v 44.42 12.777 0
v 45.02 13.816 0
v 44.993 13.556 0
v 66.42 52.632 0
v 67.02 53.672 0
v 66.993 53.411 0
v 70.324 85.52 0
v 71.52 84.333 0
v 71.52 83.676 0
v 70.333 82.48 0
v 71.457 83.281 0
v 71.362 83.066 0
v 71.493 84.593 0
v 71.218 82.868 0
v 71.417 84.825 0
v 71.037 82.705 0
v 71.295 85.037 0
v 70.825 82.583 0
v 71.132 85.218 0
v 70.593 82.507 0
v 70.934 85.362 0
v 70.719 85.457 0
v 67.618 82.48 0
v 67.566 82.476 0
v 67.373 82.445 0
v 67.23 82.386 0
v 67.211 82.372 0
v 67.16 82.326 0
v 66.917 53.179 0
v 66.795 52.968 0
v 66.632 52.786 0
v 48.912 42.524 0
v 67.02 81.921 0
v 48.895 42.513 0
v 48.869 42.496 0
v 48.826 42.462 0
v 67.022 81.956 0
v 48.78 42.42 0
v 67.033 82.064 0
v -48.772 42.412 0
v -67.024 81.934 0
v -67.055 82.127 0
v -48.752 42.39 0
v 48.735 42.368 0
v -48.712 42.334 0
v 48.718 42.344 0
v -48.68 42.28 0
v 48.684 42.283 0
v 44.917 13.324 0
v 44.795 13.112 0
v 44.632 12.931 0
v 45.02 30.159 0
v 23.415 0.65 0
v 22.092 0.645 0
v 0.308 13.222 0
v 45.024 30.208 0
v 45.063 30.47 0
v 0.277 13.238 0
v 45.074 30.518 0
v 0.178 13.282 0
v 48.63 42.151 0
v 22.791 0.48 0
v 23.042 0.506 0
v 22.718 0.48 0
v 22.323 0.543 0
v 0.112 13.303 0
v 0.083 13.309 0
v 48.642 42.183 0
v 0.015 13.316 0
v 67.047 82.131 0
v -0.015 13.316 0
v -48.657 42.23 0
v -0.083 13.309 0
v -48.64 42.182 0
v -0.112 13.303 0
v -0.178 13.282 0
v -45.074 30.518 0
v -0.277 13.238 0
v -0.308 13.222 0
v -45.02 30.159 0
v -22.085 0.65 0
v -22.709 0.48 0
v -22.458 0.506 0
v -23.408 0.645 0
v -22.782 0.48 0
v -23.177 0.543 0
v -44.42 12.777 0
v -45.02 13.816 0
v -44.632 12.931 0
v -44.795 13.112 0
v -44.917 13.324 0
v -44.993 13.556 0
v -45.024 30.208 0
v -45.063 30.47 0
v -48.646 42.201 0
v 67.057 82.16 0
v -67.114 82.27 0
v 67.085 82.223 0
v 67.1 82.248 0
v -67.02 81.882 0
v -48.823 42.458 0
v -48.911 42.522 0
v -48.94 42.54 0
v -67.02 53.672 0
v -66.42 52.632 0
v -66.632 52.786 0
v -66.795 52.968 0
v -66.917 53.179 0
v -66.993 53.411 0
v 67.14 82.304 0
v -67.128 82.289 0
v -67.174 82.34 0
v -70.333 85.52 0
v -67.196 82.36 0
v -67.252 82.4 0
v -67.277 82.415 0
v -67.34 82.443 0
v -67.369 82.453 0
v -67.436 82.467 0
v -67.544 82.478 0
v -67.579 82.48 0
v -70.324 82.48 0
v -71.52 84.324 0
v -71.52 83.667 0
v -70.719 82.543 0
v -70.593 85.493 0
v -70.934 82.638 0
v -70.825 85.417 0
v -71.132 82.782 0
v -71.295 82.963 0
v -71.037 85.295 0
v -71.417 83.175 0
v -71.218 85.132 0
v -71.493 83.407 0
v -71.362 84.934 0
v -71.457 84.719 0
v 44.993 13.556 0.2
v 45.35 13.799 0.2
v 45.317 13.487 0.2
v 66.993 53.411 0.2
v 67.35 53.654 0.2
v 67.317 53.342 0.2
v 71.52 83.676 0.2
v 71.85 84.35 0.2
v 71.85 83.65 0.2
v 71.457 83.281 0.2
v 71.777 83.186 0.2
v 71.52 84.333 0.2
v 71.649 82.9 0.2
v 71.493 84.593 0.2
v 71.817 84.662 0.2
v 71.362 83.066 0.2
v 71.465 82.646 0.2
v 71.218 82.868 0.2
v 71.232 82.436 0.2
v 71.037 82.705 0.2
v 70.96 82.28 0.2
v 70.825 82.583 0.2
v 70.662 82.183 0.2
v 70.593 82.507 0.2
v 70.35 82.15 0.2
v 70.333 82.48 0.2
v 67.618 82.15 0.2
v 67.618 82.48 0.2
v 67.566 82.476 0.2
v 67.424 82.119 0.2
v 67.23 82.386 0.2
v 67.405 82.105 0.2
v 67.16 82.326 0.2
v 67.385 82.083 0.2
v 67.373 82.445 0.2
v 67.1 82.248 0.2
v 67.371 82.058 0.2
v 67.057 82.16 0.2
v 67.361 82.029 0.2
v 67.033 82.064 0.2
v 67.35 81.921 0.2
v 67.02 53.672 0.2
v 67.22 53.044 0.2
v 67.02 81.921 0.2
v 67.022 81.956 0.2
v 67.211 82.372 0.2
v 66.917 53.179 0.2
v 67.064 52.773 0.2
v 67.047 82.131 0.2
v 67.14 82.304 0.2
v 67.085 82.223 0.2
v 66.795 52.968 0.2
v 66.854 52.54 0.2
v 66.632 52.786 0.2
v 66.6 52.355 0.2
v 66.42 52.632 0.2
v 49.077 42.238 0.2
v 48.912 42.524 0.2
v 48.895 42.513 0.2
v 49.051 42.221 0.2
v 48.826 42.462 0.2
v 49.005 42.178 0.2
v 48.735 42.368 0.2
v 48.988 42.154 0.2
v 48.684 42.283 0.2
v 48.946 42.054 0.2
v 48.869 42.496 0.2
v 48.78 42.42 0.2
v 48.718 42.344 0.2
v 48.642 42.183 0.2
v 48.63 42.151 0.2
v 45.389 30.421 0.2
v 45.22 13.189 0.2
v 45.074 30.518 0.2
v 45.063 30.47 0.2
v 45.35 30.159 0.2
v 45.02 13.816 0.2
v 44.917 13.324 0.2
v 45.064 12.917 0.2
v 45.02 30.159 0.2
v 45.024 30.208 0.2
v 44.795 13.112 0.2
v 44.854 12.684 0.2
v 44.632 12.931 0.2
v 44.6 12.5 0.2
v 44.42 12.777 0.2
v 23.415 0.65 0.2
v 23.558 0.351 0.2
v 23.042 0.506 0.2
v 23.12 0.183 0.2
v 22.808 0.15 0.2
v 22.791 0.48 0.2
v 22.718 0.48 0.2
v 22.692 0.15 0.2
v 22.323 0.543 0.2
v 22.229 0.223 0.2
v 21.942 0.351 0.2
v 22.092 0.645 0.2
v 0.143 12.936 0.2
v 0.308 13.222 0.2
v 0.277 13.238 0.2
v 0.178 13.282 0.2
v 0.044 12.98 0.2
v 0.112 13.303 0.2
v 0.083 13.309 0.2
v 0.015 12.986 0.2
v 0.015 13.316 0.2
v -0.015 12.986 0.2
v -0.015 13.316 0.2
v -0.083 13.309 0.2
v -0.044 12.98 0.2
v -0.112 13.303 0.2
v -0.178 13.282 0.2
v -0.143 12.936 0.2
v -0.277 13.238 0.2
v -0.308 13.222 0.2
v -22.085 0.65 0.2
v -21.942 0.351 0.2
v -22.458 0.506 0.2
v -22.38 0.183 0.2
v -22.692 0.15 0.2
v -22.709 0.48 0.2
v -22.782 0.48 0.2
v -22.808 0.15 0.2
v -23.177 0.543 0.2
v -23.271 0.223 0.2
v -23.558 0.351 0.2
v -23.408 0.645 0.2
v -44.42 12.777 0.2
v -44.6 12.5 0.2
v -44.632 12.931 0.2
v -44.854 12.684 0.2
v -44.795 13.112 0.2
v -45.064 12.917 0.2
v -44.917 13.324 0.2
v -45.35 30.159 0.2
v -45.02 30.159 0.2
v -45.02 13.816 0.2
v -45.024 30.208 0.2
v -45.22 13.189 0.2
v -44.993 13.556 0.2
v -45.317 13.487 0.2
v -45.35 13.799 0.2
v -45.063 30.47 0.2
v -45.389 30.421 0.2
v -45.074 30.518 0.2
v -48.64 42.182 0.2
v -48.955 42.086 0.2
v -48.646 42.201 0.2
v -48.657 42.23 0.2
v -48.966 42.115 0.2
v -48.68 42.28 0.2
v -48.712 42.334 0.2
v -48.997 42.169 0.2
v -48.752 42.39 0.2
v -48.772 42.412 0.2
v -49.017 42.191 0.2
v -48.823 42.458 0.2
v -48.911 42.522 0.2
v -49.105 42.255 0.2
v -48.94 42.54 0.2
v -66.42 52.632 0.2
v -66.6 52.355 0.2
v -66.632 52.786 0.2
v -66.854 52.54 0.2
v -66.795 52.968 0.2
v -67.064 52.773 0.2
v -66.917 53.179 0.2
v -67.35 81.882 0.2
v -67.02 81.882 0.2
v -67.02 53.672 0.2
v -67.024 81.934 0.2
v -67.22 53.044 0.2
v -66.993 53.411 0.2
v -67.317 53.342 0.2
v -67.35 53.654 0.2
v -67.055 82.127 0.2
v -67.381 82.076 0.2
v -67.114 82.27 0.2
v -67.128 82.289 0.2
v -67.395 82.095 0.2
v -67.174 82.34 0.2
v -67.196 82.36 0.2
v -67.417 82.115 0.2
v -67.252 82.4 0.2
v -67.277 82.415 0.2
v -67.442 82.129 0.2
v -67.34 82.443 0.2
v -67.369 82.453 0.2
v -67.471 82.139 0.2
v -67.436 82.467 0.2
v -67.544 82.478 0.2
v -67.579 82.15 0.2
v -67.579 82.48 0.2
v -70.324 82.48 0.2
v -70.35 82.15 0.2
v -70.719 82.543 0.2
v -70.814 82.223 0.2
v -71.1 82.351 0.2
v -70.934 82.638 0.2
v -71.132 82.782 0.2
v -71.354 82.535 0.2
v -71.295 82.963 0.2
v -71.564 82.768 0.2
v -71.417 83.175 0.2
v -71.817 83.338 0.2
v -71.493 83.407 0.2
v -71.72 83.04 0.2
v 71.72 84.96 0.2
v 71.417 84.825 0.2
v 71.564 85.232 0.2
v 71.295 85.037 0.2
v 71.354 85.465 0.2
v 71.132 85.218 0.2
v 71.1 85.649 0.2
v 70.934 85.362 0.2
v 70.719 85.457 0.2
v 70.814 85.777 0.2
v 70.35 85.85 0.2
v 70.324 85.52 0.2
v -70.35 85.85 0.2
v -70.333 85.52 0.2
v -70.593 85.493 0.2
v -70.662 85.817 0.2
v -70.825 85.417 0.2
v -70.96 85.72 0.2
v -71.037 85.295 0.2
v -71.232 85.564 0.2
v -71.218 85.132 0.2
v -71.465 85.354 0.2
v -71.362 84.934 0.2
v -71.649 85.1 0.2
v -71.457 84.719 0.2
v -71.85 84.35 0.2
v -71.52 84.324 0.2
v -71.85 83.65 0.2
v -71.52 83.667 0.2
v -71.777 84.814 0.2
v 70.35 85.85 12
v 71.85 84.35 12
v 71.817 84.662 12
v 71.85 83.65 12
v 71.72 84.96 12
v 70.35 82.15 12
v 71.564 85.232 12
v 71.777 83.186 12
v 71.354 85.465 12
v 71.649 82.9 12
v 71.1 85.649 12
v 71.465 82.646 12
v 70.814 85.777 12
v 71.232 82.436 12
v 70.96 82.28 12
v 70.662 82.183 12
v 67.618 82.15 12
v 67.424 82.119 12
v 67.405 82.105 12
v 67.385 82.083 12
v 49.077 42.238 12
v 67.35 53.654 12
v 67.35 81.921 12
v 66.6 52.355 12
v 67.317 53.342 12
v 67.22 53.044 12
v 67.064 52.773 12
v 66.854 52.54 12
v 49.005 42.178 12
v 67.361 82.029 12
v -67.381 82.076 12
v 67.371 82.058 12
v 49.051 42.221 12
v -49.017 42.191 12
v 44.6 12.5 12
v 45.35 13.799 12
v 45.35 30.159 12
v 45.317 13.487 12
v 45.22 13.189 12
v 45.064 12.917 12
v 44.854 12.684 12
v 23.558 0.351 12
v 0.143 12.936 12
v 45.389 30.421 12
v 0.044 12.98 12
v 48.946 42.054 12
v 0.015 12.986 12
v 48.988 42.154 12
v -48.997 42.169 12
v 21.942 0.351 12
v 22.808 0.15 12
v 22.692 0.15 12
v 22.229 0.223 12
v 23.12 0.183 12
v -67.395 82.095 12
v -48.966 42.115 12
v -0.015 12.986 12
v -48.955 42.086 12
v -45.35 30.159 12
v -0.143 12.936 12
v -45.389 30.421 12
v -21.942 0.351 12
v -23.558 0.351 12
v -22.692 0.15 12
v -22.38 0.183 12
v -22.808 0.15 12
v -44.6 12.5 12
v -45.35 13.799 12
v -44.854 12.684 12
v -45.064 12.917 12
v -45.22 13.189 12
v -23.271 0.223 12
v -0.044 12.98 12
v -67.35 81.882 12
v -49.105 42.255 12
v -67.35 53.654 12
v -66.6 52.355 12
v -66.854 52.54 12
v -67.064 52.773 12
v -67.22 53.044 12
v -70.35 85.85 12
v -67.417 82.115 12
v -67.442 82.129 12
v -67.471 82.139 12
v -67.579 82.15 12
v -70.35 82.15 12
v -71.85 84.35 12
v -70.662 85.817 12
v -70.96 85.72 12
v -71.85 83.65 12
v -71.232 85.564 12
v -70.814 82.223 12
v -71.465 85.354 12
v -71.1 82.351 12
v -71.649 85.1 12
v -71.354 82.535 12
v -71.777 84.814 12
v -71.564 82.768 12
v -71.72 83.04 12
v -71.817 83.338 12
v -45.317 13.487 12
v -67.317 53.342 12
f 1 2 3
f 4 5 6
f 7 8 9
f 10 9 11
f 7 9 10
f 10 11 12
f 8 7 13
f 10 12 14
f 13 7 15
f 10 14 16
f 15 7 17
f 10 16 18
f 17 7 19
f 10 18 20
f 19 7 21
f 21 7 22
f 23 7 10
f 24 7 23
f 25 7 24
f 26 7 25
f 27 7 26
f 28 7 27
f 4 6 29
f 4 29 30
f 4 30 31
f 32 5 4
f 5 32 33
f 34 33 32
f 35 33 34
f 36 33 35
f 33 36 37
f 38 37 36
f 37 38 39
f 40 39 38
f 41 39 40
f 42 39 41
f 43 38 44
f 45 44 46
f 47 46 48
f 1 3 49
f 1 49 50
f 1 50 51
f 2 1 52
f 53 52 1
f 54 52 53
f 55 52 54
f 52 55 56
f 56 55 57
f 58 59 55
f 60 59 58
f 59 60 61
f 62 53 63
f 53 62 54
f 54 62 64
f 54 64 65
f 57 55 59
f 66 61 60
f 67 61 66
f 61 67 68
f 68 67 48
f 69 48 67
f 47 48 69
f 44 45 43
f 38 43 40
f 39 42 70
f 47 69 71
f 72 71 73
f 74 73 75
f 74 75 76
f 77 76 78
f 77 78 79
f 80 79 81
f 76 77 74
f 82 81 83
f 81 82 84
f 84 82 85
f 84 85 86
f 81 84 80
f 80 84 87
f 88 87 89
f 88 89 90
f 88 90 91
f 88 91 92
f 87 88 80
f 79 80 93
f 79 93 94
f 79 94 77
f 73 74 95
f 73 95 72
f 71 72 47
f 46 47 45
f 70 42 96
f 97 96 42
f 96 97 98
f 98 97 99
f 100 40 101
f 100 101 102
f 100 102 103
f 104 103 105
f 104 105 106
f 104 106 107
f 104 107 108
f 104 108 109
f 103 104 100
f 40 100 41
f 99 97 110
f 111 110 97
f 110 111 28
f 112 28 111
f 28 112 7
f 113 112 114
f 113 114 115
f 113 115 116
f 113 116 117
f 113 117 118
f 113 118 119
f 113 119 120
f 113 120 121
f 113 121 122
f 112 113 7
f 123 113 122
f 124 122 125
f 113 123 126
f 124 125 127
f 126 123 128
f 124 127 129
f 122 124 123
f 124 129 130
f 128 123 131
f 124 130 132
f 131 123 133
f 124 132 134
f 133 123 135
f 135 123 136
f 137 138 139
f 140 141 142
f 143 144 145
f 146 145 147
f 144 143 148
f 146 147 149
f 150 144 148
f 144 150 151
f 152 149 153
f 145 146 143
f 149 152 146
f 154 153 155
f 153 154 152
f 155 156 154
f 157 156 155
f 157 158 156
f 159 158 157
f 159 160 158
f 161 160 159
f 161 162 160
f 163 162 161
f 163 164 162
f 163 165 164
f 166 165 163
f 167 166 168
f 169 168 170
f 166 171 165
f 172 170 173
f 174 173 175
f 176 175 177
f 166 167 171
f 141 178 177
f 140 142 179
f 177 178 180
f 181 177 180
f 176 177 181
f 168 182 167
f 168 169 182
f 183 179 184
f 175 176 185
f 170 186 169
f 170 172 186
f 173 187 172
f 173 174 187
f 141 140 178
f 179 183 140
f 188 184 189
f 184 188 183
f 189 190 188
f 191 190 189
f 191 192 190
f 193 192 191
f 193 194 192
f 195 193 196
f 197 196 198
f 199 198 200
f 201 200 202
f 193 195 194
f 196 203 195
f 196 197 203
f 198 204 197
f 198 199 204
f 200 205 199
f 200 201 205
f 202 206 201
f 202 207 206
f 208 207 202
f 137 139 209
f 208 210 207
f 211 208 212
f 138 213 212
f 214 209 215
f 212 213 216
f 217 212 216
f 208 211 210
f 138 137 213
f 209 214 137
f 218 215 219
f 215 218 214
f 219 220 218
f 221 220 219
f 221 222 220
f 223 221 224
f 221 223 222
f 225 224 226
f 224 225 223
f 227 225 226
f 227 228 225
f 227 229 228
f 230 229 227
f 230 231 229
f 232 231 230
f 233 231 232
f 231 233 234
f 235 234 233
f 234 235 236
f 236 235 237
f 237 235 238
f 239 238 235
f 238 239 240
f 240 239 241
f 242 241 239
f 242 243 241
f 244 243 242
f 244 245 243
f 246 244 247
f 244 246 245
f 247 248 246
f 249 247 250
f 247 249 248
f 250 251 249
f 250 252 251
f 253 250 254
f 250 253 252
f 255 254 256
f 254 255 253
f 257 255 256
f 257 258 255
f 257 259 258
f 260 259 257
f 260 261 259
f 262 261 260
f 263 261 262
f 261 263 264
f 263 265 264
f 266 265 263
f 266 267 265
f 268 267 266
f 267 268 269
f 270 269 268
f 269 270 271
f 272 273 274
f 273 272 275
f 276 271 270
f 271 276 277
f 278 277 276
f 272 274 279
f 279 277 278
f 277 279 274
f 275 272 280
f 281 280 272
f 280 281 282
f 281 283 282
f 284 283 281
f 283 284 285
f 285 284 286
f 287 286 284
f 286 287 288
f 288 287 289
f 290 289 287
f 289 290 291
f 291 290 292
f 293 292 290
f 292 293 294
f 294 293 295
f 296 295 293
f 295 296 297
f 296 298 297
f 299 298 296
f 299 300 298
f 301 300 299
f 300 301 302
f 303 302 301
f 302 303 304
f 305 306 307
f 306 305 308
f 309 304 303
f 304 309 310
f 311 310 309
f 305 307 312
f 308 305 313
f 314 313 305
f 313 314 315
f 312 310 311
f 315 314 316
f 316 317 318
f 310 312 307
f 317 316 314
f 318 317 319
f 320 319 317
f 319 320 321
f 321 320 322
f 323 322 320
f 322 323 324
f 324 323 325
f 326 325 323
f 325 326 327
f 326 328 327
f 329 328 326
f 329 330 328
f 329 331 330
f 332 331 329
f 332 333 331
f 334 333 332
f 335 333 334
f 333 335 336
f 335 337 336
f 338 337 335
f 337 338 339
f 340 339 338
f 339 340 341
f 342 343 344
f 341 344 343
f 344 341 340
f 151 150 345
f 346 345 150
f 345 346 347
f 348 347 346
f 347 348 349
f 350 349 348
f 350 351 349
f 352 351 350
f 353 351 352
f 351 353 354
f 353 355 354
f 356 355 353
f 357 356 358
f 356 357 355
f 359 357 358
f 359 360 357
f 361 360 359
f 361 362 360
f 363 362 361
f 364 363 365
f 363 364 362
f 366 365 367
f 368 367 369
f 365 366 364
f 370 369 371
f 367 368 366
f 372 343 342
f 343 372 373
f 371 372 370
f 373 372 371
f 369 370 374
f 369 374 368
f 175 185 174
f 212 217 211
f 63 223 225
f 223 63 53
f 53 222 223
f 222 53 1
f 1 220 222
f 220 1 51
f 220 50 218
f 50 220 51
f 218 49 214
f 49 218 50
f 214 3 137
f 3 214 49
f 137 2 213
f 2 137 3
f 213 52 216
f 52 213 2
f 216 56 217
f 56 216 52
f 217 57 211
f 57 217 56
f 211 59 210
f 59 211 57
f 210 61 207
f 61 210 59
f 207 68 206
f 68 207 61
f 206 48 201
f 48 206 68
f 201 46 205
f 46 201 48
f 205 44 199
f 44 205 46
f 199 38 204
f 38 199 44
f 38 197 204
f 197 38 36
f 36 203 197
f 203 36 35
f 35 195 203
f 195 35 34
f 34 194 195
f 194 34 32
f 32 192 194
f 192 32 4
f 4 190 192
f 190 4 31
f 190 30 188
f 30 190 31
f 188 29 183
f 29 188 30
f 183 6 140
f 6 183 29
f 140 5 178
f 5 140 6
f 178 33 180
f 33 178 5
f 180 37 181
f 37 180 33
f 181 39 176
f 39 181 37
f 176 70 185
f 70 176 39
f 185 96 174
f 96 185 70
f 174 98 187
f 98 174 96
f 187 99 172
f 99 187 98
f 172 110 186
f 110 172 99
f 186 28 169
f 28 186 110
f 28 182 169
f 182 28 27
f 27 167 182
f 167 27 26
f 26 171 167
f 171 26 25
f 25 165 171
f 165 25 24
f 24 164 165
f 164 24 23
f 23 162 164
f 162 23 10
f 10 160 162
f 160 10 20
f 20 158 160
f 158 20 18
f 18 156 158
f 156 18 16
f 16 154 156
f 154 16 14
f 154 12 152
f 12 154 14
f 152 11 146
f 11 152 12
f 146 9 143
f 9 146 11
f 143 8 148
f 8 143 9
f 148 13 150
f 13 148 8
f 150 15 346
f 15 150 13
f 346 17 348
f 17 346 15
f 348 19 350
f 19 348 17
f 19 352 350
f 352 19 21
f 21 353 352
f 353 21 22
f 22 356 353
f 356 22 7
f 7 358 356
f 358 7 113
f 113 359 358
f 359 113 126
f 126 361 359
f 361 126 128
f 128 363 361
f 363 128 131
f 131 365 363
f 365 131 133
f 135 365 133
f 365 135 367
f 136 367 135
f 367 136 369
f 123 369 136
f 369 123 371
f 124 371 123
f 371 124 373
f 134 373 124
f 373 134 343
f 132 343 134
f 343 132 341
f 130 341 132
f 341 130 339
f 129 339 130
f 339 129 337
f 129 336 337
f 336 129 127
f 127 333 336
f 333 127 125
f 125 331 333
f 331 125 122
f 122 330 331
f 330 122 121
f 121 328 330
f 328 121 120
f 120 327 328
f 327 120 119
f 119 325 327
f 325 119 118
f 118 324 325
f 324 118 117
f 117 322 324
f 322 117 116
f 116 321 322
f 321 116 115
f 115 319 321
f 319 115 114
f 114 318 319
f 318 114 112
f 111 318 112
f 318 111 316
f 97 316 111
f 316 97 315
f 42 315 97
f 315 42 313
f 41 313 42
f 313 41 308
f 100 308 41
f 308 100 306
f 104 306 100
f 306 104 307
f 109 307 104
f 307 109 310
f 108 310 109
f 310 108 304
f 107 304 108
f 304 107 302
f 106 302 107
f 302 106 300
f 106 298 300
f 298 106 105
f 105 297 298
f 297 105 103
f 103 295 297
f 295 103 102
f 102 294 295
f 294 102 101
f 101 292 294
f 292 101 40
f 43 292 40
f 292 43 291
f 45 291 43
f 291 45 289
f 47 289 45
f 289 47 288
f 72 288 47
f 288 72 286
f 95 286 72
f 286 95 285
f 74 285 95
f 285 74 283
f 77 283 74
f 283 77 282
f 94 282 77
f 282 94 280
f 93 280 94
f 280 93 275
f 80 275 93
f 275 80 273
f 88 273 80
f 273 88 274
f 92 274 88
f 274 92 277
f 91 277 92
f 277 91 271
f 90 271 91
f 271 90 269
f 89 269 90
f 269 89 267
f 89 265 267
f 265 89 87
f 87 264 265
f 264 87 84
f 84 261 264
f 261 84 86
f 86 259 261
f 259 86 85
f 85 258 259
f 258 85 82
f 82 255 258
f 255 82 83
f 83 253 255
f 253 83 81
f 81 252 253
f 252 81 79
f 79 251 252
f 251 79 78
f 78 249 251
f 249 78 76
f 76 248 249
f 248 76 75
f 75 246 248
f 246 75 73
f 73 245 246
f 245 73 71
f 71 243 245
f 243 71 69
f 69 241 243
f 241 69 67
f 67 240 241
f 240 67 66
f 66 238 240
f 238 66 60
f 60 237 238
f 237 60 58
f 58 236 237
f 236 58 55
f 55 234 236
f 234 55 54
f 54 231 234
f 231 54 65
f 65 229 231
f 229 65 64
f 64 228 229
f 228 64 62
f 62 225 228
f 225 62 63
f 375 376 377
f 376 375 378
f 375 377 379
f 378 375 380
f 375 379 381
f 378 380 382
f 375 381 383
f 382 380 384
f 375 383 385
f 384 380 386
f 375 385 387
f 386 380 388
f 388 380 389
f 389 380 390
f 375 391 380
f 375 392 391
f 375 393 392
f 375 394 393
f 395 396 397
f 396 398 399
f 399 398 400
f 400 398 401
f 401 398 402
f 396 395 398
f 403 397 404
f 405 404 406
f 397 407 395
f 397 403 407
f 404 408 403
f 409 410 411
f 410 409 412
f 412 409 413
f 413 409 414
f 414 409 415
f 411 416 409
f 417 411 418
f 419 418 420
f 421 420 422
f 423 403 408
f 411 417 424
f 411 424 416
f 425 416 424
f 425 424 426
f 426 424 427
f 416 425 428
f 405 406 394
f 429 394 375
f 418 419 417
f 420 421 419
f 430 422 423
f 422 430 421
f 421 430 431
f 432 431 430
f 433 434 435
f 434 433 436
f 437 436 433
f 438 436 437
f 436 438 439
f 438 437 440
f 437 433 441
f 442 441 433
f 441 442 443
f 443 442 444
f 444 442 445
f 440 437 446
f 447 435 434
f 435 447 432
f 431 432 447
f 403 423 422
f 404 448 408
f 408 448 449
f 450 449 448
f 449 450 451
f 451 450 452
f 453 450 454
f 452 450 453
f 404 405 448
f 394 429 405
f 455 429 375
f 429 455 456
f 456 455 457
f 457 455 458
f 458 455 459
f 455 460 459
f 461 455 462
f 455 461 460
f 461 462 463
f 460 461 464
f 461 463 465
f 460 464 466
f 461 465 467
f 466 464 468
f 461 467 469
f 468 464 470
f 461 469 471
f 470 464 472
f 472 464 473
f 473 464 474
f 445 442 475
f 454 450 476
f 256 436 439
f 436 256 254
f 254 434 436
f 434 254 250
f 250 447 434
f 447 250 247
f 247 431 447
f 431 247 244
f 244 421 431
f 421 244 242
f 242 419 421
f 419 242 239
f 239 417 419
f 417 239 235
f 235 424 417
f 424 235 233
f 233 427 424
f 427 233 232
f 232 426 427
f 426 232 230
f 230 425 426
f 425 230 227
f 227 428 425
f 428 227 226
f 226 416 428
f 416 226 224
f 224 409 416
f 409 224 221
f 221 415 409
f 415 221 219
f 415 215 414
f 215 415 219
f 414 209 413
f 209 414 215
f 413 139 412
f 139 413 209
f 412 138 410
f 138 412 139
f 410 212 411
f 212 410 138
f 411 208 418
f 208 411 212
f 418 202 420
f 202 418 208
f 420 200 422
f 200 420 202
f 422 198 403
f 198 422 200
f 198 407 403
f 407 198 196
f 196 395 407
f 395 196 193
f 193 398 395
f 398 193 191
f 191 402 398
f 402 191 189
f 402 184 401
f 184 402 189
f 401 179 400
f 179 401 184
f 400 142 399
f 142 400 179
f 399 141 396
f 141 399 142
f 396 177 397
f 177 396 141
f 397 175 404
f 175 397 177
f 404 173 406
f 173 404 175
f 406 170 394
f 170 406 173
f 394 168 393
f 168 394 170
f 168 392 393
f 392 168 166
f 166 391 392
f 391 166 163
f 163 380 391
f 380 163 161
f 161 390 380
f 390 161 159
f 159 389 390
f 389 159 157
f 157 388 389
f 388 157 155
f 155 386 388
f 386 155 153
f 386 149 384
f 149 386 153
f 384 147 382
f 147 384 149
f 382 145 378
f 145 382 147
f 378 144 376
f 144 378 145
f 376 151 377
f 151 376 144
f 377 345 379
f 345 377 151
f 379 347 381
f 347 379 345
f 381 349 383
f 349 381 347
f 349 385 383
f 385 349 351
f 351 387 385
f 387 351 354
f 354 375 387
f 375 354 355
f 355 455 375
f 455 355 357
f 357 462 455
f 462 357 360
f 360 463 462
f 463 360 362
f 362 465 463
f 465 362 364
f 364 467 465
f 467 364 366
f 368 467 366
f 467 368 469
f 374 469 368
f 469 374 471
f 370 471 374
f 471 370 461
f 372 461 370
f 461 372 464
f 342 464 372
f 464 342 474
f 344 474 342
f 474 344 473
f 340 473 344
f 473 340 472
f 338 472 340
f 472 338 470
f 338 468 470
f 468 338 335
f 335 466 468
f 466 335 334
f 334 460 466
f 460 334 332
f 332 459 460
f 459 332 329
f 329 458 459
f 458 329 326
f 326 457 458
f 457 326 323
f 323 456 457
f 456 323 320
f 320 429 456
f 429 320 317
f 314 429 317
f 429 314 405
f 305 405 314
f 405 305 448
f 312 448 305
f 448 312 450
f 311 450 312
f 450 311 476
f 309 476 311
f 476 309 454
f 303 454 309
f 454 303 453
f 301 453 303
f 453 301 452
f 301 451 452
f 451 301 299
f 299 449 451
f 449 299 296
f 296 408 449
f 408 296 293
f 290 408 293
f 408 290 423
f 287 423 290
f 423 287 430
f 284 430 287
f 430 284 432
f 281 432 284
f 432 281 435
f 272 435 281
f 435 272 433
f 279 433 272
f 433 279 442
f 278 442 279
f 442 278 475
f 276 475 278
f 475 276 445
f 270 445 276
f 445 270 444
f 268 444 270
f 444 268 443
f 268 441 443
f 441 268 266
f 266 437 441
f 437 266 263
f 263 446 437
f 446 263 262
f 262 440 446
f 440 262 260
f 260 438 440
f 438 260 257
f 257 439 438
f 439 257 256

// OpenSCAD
eps = 0.001;

// Cavity dimensions.
major_width = 133;
major_height = 82;
minor_width = 89;
minor_height = 40;

cavity_length = 120;

wall = 5;
roundoff = min(1.9, wall*0.45);

module cavity_2d(boxy=false) {
  flat = 1;
  for (a = [-1, 1]) {
    scale([a, 1]) {
      polygon([
        [-eps, boxy ? 0 : minor_width*tan(30)/4],
        [minor_width/4, 0],
        [minor_width/4 + flat, 0],
        [minor_width/2 + flat, boxy ? 0 : minor_width*tan(30)/4],
        [minor_width/2 + flat, boxy ? 0 : minor_height],
        [major_width/2 + flat, boxy ? 0 : minor_height + (major_width-minor_width)*tan(30)/2],
        [major_width/2 + flat, major_height],
        [-eps, major_height],
      ]);
      
      // Flare the bottom to make it easier to drop the cards in.
      translate([-minor_width/2, minor_height-13])
        rotate([0, 0, 17])
          square([20, 35]);
    }
  }
}

module inner_profile_2d(boxy=false) {
  offset(roundoff, $fn=30) {
    offset(-roundoff) {
      translate([0, wall]) {
        difference() {
          offset(delta=wall)
            cavity_2d(boxy=boxy);
          cavity_2d(boxy=false);
          
          // Cut off the ceiling.
          translate([-500, major_height - eps])
            square(1000);
        }
      }
    }
  }
}

module end_profile_2d() {
  hull()
    inner_profile_2d(boxy=true);
}

module tray() {
  end_wall = wall;

  rotate([90, 0, 0]) {
    for (a = [-1, 1]) {
      scale([1, 1, a]) {
        translate([0, 0, cavity_length/2]) {
          linear_extrude(end_wall - roundoff)
            end_profile_2d();
            
          steps = 30;
          for (b = [0 : 1/steps : 1-1/steps])
            translate([0, 0, end_wall + (b-1)*roundoff])
              linear_extrude(0.1)
                offset(-roundoff * (1-sqrt(1-b*b)))
                  end_profile_2d();
        }
      }
    }
      
    translate([0, 0, -cavity_length/2])
      linear_extrude(cavity_length)
        inner_profile_2d(boxy=true);
  }
}

divider_top = 4;

module divider_2d() {
  slack = 0.15;
  small_roundoff = 1.5;
  top_width = major_width + 2*wall + 1;

  offset(small_roundoff, $fn=30) {
    offset(-small_roundoff - slack) {
      cavity_2d();
      
      translate([-top_width/2, major_height])
        square([top_width, divider_top]);
    }
  }
}

module divider() {
  length = 12;

  linear_extrude(0.2)
    offset(-0.33)
      divider_2d();
  translate([0, 0, 0.2])
    linear_extrude(length - 0.2)
      divider_2d();
}

module main() {
  divider();
}

main();
